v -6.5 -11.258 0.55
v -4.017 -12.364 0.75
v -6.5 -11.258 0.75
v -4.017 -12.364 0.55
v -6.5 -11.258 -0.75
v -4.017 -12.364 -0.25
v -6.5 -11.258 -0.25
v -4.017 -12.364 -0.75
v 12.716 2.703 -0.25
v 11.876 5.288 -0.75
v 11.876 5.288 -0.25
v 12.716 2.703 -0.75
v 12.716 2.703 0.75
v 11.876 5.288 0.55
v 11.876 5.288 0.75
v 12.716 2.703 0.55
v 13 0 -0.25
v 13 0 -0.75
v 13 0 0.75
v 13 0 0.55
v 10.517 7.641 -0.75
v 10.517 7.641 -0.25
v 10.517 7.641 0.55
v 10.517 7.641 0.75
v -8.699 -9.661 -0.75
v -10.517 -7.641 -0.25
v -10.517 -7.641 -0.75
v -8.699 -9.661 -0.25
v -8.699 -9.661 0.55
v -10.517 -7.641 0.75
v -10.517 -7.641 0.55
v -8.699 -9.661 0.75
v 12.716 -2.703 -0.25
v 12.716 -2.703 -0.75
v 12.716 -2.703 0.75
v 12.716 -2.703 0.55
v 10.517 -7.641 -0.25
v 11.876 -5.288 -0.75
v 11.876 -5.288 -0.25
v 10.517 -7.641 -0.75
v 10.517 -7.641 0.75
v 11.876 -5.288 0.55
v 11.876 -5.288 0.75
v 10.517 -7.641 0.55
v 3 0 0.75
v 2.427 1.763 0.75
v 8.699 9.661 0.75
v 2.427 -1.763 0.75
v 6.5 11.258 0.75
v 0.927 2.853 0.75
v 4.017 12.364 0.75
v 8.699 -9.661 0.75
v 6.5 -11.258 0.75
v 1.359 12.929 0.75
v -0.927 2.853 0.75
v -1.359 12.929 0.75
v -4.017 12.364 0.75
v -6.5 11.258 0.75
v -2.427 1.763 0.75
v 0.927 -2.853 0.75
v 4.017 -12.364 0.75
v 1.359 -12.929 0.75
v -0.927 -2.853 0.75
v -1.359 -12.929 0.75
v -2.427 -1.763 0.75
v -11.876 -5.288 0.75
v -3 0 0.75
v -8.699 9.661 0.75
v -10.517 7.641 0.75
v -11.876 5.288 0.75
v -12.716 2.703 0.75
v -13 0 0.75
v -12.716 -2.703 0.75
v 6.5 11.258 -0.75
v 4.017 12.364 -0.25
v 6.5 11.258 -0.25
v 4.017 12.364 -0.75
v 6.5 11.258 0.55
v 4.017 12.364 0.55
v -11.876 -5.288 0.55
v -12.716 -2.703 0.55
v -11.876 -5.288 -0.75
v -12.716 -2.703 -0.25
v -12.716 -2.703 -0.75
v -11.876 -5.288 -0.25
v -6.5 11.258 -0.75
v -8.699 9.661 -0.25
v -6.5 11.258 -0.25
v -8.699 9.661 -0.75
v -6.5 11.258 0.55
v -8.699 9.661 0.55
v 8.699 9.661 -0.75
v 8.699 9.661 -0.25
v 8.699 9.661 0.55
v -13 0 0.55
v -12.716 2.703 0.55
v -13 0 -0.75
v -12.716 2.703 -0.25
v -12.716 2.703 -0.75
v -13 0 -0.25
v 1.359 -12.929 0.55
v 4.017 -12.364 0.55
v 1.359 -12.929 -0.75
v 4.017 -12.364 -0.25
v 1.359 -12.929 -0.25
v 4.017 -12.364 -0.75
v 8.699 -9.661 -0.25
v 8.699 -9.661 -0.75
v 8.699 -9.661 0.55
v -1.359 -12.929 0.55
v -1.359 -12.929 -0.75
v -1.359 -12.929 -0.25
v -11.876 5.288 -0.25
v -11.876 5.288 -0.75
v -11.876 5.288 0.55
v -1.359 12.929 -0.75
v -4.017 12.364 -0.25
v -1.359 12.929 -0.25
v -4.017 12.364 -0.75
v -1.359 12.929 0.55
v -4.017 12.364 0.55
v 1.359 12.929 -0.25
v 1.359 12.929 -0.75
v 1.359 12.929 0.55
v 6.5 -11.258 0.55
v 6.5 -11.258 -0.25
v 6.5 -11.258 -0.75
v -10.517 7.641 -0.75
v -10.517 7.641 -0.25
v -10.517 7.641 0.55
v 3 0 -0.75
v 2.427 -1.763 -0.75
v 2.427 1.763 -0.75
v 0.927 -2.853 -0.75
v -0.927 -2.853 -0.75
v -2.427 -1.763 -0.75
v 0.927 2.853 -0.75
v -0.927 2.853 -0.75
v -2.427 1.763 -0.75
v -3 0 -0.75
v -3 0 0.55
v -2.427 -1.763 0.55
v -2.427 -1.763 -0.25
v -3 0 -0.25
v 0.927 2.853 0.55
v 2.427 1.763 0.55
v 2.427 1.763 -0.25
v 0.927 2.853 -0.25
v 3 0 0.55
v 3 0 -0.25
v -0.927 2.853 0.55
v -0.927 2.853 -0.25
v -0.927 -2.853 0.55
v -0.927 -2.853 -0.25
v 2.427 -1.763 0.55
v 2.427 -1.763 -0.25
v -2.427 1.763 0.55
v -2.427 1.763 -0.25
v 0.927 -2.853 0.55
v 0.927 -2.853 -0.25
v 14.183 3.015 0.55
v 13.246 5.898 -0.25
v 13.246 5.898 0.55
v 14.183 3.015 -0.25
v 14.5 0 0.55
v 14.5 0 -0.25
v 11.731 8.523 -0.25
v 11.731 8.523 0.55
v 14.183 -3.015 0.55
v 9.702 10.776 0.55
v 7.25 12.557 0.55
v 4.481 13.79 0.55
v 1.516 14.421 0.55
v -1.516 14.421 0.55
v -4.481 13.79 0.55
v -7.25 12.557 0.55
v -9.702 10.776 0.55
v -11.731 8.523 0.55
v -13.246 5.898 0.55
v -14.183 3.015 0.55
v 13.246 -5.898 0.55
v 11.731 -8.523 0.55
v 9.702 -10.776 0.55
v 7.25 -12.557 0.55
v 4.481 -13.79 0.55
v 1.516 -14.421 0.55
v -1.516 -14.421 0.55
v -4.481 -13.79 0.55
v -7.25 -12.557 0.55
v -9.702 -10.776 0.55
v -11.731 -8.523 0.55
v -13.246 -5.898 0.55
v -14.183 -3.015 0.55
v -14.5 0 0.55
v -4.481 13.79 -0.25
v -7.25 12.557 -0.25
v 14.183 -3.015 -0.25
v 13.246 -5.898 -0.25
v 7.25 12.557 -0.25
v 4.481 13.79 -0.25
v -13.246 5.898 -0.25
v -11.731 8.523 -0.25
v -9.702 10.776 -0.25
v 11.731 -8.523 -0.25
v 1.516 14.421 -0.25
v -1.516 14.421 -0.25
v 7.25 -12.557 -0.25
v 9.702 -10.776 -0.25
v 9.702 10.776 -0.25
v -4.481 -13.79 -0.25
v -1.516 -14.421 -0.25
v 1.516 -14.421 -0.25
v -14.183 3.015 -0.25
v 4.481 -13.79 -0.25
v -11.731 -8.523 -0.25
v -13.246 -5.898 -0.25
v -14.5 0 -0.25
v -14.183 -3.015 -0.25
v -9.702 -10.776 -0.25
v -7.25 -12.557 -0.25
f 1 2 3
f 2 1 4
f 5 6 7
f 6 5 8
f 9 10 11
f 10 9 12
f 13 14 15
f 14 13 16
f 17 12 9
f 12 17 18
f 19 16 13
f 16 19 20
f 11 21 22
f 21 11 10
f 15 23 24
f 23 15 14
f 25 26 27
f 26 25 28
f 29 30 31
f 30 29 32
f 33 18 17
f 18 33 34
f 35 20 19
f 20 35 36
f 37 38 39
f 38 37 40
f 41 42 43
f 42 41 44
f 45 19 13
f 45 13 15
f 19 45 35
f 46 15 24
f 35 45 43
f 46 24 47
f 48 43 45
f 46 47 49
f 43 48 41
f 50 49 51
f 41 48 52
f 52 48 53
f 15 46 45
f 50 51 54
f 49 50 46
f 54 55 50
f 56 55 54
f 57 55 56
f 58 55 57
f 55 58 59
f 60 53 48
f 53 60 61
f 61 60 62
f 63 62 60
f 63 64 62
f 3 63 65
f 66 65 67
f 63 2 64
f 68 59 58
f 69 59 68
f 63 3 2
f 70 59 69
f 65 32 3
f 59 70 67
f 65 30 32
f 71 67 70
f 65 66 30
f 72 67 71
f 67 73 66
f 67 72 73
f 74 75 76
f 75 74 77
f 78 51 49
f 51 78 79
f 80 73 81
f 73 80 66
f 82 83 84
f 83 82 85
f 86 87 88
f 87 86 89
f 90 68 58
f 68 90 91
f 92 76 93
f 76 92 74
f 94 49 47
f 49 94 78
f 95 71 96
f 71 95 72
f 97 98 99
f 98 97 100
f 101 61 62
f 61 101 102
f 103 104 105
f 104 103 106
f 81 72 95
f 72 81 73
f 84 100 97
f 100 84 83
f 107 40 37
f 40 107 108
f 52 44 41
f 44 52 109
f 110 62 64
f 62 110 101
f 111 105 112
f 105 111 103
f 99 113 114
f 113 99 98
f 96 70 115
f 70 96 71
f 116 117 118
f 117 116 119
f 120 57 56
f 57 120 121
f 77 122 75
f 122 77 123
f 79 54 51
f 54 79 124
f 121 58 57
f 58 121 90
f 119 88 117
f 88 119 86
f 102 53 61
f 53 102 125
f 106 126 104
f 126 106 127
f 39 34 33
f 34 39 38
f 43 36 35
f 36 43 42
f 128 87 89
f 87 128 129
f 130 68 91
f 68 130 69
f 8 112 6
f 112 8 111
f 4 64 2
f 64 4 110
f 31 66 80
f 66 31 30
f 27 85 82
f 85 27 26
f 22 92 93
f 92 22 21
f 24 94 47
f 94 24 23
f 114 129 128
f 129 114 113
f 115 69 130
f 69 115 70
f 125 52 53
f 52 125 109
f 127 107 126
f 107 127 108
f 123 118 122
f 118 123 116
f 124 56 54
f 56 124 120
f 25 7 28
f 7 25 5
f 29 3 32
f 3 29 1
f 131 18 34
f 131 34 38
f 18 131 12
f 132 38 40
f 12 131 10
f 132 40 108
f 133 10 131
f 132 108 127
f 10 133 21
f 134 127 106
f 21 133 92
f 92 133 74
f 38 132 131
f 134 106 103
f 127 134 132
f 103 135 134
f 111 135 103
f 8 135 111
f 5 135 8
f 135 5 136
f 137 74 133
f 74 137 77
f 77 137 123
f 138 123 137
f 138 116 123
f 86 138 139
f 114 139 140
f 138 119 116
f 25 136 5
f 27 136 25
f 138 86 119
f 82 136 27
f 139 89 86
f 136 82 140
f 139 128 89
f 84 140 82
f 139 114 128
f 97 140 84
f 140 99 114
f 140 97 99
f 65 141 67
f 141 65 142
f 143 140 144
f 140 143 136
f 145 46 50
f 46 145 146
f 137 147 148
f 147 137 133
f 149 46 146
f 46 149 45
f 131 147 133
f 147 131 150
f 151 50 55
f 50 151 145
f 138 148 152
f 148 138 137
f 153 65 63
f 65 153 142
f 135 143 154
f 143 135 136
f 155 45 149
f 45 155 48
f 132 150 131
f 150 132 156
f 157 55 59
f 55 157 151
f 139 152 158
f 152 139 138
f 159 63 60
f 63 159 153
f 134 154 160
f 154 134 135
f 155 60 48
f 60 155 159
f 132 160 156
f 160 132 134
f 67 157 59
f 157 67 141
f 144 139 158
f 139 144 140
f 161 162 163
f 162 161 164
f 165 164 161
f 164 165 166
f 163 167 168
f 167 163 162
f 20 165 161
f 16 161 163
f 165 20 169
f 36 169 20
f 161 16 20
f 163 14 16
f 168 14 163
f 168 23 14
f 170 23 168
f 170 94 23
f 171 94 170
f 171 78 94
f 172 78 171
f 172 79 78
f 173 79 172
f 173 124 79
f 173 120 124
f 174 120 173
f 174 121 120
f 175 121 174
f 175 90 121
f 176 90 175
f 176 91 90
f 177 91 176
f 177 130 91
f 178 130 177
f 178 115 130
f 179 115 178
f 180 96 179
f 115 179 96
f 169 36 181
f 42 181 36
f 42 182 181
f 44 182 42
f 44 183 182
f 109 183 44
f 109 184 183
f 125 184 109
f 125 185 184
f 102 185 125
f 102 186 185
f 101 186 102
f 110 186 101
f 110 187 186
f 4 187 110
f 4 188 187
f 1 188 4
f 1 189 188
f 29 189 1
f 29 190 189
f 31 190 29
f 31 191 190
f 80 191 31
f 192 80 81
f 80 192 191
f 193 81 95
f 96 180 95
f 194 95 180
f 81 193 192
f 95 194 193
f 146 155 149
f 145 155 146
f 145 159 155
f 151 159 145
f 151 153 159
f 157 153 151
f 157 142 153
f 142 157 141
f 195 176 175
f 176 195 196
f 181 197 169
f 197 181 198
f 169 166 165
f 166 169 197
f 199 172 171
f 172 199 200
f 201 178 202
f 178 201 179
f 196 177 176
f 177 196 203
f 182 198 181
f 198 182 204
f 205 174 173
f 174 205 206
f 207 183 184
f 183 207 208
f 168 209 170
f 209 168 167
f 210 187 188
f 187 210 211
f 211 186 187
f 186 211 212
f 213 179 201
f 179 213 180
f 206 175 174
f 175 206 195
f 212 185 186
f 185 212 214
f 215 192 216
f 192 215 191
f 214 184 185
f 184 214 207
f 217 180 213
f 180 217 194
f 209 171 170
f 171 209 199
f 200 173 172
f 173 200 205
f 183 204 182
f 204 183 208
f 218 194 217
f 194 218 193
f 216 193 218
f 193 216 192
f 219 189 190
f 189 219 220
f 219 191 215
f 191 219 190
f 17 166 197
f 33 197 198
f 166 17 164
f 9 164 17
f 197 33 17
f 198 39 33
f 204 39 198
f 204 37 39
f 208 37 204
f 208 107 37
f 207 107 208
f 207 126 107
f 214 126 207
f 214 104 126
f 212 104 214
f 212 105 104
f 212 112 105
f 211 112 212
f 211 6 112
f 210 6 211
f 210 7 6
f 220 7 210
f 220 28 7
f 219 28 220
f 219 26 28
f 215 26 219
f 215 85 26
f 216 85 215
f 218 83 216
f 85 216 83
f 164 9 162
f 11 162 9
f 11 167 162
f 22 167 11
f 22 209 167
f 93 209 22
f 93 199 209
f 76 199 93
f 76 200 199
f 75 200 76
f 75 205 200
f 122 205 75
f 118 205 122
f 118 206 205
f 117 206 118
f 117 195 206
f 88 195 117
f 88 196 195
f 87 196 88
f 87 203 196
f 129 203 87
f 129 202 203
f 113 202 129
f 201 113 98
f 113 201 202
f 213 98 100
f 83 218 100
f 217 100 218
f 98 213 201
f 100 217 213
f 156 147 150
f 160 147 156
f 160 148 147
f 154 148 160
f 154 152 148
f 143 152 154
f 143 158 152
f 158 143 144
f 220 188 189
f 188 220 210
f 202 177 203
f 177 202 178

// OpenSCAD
// Parameters
inner_diameter = 6; //[3:12:0.1]
outer_diameter = 26; //[13:52:0.1]
thickness = 1.5; //[0.75:3:0.05]
eps = 0.5; //[0.2:2:0.1]
grommet_lip_thickness = 0.8; //[0.4:1.6:0.05]
grommet_lip_radial = 1.5; //[0.75:3:0.05]

// Connectivity overlap (1-2mm) to guarantee attachment
overlap = 1.0;

// Penny Washer - complete geometry
module penny_washer() {
  color("Silver")
  difference() {
    cylinder(r=outer_diameter/2, h=thickness, center=true);
    cylinder(r=inner_diameter/2, h=thickness + 2*eps, center=true);
  }
}

// Round Grommet Top - attached to washer with overlap
module round_grommet_top() {
  // Place so it intersects the washer by `overlap`
  // Washer top face (centered) is at +thickness/2
  // Grommet bottom face (centered) is at z - grommet_lip_thickness/2
  // Set bottom = washer_top - overlap
  zc = (thickness/2 - overlap) + grommet_lip_thickness/2;

  color("DimGray")
    translate([0, 0, zc])
      cylinder(r=outer_diameter/2 + grommet_lip_radial,
               h=grommet_lip_thickness,
               center=true);
}

// Single connected washer body (no extra floating rods)
module washer() {
  union() {
    penny_washer();
    round_grommet_top();
  }
}

// Output: washer only (as requested)
washer();
